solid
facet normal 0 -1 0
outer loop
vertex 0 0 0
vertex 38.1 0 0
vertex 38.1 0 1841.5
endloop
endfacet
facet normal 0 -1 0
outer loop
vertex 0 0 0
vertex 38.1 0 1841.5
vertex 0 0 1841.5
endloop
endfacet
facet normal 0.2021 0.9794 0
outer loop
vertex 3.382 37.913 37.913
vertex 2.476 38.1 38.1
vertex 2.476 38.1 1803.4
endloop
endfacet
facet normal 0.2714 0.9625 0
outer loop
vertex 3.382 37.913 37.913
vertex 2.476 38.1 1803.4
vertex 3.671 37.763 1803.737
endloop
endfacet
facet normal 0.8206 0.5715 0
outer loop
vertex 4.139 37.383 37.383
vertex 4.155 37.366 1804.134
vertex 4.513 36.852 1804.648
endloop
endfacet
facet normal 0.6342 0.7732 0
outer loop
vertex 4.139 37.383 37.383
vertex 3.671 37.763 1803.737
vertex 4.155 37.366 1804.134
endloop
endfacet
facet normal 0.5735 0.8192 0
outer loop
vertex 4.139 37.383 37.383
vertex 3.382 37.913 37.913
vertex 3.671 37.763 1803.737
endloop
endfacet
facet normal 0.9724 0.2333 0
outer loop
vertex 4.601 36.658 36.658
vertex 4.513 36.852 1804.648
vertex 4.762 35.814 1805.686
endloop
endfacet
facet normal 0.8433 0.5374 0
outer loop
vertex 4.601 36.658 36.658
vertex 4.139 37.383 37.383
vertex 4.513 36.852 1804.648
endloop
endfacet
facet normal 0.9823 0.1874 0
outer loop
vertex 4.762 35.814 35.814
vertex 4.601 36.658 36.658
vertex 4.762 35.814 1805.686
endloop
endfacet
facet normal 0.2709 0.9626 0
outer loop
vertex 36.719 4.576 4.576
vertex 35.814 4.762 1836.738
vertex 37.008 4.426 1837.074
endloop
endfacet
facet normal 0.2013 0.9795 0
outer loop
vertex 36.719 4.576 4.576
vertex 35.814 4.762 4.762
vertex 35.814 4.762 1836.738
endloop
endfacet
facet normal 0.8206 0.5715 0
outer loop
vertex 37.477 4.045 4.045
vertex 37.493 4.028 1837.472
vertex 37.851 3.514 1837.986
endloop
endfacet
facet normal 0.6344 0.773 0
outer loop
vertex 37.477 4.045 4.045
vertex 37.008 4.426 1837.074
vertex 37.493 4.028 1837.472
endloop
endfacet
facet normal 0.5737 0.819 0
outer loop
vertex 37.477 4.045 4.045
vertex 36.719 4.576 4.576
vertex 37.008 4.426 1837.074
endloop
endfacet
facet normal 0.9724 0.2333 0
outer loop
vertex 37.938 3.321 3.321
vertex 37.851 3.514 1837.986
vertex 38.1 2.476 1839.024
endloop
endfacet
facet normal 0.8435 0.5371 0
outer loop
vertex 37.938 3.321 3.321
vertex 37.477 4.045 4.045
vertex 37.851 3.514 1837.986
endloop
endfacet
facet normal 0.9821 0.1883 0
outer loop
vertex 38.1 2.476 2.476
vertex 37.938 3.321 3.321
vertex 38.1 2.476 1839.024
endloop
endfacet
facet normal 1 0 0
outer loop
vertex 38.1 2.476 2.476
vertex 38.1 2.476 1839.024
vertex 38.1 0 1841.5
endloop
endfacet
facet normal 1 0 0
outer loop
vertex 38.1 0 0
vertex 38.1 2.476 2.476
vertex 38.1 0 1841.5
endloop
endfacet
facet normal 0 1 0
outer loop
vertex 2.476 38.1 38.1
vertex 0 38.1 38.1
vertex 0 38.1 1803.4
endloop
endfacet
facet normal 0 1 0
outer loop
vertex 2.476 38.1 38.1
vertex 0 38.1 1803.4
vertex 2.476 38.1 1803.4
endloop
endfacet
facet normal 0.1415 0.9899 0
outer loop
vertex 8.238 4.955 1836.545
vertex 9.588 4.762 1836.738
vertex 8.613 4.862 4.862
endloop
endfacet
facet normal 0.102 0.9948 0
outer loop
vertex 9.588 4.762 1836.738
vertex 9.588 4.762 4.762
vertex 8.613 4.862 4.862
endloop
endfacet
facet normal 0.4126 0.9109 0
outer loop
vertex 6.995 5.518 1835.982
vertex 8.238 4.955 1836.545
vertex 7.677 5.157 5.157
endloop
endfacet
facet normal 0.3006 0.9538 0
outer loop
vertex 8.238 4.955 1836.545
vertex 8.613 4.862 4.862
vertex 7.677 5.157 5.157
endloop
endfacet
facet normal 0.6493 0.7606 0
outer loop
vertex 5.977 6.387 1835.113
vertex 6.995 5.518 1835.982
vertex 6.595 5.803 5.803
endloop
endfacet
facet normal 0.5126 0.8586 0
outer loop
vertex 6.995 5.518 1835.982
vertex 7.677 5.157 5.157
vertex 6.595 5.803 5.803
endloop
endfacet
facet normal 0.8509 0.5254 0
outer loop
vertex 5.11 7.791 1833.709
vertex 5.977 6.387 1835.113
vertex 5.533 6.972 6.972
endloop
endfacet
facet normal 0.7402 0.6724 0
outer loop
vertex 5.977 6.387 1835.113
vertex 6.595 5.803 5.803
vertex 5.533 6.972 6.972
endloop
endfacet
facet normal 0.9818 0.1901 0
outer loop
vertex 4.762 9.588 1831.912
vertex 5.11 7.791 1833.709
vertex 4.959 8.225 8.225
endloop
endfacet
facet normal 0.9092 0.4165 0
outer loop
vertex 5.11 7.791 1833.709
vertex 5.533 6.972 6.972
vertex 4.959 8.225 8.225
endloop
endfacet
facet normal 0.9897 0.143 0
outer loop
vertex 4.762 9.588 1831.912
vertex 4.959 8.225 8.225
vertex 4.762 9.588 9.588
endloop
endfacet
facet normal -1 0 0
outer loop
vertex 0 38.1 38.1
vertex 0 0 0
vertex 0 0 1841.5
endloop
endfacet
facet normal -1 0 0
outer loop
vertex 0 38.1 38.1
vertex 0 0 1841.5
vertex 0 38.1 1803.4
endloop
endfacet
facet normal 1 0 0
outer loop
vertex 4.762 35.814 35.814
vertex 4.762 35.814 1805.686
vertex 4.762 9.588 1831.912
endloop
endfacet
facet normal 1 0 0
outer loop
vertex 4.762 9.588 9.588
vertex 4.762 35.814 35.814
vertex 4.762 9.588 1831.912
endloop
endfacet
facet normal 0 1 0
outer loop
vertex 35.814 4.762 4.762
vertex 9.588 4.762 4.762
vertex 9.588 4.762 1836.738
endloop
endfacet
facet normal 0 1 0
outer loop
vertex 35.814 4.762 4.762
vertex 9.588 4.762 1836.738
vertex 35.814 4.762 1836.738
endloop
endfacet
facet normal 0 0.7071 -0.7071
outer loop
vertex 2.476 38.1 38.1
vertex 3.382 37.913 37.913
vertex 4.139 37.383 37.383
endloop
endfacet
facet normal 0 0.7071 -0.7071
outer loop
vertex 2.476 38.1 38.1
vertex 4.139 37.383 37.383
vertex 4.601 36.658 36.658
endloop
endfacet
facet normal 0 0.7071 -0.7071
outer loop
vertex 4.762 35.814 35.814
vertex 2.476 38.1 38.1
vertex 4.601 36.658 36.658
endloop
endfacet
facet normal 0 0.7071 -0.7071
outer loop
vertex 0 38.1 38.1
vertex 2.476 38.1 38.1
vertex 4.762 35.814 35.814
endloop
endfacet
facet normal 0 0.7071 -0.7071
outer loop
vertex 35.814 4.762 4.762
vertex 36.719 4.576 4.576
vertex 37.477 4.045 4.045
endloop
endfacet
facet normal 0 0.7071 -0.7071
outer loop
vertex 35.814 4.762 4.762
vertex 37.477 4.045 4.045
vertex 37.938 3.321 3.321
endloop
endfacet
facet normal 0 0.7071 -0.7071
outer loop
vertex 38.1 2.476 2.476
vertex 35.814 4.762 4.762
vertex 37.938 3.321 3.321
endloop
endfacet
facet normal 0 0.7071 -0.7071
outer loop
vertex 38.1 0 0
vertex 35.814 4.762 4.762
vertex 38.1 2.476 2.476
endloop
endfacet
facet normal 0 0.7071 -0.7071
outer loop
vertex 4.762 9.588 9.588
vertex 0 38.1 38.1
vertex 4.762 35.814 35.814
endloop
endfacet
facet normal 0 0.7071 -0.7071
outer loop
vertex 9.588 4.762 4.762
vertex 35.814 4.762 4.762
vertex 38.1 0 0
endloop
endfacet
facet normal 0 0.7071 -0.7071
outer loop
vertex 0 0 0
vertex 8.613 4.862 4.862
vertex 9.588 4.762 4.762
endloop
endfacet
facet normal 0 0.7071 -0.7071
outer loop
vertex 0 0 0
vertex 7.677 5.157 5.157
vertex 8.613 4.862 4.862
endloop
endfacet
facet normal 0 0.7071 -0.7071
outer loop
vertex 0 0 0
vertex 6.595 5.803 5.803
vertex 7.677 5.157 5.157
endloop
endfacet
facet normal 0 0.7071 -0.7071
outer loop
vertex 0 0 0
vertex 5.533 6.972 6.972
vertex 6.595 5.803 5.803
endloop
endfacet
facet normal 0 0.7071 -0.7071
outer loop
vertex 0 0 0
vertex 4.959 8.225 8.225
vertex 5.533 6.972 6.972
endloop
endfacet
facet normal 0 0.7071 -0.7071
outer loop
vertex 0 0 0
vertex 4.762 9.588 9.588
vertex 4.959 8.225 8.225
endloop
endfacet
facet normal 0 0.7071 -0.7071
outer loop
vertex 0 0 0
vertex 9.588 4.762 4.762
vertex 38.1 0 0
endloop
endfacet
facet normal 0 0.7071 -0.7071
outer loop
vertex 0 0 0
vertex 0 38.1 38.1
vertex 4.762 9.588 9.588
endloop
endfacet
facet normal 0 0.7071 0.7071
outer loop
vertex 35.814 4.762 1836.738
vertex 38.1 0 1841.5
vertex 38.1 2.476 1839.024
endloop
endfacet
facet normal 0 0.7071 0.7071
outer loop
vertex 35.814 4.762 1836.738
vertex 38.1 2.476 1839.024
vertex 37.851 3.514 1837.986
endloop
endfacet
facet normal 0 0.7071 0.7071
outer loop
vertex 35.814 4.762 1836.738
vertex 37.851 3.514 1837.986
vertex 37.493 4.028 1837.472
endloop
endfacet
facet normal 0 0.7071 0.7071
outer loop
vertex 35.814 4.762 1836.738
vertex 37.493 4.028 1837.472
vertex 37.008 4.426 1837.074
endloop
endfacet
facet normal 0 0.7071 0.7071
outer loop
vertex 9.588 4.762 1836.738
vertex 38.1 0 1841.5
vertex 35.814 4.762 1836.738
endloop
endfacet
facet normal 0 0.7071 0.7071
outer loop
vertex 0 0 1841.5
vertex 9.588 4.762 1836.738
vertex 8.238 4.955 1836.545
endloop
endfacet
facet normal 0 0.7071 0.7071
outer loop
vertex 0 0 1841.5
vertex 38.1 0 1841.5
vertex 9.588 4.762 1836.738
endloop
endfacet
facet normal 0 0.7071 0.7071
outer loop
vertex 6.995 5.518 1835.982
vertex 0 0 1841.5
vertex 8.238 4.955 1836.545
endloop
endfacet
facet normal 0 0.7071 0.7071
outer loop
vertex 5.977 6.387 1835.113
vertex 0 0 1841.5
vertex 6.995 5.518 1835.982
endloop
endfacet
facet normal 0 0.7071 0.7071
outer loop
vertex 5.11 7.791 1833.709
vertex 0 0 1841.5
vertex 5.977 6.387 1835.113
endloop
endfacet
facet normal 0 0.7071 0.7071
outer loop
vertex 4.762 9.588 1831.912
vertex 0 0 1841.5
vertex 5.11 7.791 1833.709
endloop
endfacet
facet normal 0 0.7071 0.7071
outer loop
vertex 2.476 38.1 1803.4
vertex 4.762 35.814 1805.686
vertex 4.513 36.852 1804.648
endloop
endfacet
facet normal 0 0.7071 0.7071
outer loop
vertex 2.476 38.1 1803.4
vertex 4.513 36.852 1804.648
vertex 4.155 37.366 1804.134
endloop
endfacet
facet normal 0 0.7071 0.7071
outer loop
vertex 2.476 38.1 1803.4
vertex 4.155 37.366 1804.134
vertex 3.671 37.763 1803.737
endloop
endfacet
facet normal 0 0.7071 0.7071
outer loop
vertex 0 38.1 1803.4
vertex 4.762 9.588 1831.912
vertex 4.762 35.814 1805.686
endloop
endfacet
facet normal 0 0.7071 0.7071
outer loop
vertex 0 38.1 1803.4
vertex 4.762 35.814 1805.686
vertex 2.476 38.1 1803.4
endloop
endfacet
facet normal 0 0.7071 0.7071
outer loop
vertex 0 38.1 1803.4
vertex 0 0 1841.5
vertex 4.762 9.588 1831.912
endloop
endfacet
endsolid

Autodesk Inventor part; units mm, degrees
ref_plane "Start plane" through (0, 0, 0) normal (0, 0, 1) x (1, 0, 0)
ref_plane "End plane" through (0, 0, 1841.5) normal (0, 0, 1) x (1, 0, 0)
sketch "Sketch" plane through (0, 0, 0) normal (0, 0, 1) x (1, 0, 0)
  line L0 (38.1, 0) -> (0, 0)
  line L1 (0, 0) -> (0, 38.1)
  line L2 (0, 38.1) -> (2.4765, 38.1)
  line L3 (4.7625, 35.814) -> (4.7625, 9.5885)
  line L4 (9.5885, 4.7625) -> (35.814, 4.7625)
  line L5 (38.1, 2.4765) -> (38.1, 0)
  line L6 (0, -11.0414) -> (0, 31.5385) construction
  line L7 (-11.0414, 0) -> (31.5385, 0) construction
  arc A0 (4.7625, 9.5885) -> (9.5885, 4.7625) centre (9.5885, 9.5885) ccw
  arc A1 (4.7625, 35.814) -> (2.4765, 38.1) centre (2.4765, 35.814) ccw
  arc A2 (38.1, 2.4765) -> (35.814, 4.7625) centre (35.814, 2.4765) ccw
  line L8 (0, 48.4964) -> (0, -20.9644) construction
  line L9 (-20.9644, 0) -> (48.4964, 0) construction
  point P0 (4.7625, 38.1)
  point P1 (4.7625, 4.7625)
  point P2 (38.1, 4.7625)
  dimension "d0" = 38.1
  dimension "d1" = 38.1
  dimension "d2" = 4.7625
  dimension "d3" = 4.7625
  dimension "d10" = 0
  dimension "d11" = 0
  dimension "d14" = 4.826
  dimension "d15" = 2.286
extrude "Body" add sketch "Sketch" along normal up to surface (1841.5 mm away) from surface at 0
sketch "Sketch3" plane through (0, 0, 0) normal (0, 0, 1) x (1, 0, 0)
  line L0 (0, 0) -> (10, 0)
ref_plane "Work Plane3" through (0, 0, 0) normal (0, -1, 0) x (1, 0, 0)
sketch "Sketch4" plane through (0, 0, 0) normal (0, -1, 0) x (1, 0, 0)
  line L0 (-2, 0) -> (12, 0)
  line L1 (-2, 1841.5) -> (12, 1841.5)
  dimension "d17" = 1841.5
ref_plane "Work Plane4" through (19.05, 0, 0) normal (0, 0.7071, -0.7071) x (1, 0, 0)
split "Split1" plane through (19.05, 0, 0) removes the side toward (0, 0.7071, -0.7071)
ref_plane "Work Plane5" through (19.05, 0, 1841.5) normal (0, 0.7071, 0.7071) x (1, 0, 0)
split "Split2" plane through (19.05, 0, 1841.5) removes the side toward (0, 0.7071, 0.7071)
equation "\"d0\" = G_H"
equation "\"d1\" = G_H"
equation "\"d2\" = G_T"
equation "\"d3\" = G_T"
equation "\"d14\" = G_IR"
equation "\"d15\" = G_ER"
equation "\"d4\" = G_L"
equation "\"G_H\" = 38.1"
equation "\"G_T\" = 4.7625"
equation "\"G_ER\" = 2.286"
equation "\"G_IR\" = 4.826"
equation "\"G_L\" = d17"
equation "\"ex\" = 0"
equation "\"G_OFFSET_START\" = 0"
equation "\"G_OFFSET_END\" = 0"
equation "\"d13\" = G_OFFSET_END + B_L"
equation "\"B_L\" = 1841.5"
properties part number "AISC - L 1.5 x 1.5 x 3/16 - 72.5" material "Aluminum 6061-AHC"
